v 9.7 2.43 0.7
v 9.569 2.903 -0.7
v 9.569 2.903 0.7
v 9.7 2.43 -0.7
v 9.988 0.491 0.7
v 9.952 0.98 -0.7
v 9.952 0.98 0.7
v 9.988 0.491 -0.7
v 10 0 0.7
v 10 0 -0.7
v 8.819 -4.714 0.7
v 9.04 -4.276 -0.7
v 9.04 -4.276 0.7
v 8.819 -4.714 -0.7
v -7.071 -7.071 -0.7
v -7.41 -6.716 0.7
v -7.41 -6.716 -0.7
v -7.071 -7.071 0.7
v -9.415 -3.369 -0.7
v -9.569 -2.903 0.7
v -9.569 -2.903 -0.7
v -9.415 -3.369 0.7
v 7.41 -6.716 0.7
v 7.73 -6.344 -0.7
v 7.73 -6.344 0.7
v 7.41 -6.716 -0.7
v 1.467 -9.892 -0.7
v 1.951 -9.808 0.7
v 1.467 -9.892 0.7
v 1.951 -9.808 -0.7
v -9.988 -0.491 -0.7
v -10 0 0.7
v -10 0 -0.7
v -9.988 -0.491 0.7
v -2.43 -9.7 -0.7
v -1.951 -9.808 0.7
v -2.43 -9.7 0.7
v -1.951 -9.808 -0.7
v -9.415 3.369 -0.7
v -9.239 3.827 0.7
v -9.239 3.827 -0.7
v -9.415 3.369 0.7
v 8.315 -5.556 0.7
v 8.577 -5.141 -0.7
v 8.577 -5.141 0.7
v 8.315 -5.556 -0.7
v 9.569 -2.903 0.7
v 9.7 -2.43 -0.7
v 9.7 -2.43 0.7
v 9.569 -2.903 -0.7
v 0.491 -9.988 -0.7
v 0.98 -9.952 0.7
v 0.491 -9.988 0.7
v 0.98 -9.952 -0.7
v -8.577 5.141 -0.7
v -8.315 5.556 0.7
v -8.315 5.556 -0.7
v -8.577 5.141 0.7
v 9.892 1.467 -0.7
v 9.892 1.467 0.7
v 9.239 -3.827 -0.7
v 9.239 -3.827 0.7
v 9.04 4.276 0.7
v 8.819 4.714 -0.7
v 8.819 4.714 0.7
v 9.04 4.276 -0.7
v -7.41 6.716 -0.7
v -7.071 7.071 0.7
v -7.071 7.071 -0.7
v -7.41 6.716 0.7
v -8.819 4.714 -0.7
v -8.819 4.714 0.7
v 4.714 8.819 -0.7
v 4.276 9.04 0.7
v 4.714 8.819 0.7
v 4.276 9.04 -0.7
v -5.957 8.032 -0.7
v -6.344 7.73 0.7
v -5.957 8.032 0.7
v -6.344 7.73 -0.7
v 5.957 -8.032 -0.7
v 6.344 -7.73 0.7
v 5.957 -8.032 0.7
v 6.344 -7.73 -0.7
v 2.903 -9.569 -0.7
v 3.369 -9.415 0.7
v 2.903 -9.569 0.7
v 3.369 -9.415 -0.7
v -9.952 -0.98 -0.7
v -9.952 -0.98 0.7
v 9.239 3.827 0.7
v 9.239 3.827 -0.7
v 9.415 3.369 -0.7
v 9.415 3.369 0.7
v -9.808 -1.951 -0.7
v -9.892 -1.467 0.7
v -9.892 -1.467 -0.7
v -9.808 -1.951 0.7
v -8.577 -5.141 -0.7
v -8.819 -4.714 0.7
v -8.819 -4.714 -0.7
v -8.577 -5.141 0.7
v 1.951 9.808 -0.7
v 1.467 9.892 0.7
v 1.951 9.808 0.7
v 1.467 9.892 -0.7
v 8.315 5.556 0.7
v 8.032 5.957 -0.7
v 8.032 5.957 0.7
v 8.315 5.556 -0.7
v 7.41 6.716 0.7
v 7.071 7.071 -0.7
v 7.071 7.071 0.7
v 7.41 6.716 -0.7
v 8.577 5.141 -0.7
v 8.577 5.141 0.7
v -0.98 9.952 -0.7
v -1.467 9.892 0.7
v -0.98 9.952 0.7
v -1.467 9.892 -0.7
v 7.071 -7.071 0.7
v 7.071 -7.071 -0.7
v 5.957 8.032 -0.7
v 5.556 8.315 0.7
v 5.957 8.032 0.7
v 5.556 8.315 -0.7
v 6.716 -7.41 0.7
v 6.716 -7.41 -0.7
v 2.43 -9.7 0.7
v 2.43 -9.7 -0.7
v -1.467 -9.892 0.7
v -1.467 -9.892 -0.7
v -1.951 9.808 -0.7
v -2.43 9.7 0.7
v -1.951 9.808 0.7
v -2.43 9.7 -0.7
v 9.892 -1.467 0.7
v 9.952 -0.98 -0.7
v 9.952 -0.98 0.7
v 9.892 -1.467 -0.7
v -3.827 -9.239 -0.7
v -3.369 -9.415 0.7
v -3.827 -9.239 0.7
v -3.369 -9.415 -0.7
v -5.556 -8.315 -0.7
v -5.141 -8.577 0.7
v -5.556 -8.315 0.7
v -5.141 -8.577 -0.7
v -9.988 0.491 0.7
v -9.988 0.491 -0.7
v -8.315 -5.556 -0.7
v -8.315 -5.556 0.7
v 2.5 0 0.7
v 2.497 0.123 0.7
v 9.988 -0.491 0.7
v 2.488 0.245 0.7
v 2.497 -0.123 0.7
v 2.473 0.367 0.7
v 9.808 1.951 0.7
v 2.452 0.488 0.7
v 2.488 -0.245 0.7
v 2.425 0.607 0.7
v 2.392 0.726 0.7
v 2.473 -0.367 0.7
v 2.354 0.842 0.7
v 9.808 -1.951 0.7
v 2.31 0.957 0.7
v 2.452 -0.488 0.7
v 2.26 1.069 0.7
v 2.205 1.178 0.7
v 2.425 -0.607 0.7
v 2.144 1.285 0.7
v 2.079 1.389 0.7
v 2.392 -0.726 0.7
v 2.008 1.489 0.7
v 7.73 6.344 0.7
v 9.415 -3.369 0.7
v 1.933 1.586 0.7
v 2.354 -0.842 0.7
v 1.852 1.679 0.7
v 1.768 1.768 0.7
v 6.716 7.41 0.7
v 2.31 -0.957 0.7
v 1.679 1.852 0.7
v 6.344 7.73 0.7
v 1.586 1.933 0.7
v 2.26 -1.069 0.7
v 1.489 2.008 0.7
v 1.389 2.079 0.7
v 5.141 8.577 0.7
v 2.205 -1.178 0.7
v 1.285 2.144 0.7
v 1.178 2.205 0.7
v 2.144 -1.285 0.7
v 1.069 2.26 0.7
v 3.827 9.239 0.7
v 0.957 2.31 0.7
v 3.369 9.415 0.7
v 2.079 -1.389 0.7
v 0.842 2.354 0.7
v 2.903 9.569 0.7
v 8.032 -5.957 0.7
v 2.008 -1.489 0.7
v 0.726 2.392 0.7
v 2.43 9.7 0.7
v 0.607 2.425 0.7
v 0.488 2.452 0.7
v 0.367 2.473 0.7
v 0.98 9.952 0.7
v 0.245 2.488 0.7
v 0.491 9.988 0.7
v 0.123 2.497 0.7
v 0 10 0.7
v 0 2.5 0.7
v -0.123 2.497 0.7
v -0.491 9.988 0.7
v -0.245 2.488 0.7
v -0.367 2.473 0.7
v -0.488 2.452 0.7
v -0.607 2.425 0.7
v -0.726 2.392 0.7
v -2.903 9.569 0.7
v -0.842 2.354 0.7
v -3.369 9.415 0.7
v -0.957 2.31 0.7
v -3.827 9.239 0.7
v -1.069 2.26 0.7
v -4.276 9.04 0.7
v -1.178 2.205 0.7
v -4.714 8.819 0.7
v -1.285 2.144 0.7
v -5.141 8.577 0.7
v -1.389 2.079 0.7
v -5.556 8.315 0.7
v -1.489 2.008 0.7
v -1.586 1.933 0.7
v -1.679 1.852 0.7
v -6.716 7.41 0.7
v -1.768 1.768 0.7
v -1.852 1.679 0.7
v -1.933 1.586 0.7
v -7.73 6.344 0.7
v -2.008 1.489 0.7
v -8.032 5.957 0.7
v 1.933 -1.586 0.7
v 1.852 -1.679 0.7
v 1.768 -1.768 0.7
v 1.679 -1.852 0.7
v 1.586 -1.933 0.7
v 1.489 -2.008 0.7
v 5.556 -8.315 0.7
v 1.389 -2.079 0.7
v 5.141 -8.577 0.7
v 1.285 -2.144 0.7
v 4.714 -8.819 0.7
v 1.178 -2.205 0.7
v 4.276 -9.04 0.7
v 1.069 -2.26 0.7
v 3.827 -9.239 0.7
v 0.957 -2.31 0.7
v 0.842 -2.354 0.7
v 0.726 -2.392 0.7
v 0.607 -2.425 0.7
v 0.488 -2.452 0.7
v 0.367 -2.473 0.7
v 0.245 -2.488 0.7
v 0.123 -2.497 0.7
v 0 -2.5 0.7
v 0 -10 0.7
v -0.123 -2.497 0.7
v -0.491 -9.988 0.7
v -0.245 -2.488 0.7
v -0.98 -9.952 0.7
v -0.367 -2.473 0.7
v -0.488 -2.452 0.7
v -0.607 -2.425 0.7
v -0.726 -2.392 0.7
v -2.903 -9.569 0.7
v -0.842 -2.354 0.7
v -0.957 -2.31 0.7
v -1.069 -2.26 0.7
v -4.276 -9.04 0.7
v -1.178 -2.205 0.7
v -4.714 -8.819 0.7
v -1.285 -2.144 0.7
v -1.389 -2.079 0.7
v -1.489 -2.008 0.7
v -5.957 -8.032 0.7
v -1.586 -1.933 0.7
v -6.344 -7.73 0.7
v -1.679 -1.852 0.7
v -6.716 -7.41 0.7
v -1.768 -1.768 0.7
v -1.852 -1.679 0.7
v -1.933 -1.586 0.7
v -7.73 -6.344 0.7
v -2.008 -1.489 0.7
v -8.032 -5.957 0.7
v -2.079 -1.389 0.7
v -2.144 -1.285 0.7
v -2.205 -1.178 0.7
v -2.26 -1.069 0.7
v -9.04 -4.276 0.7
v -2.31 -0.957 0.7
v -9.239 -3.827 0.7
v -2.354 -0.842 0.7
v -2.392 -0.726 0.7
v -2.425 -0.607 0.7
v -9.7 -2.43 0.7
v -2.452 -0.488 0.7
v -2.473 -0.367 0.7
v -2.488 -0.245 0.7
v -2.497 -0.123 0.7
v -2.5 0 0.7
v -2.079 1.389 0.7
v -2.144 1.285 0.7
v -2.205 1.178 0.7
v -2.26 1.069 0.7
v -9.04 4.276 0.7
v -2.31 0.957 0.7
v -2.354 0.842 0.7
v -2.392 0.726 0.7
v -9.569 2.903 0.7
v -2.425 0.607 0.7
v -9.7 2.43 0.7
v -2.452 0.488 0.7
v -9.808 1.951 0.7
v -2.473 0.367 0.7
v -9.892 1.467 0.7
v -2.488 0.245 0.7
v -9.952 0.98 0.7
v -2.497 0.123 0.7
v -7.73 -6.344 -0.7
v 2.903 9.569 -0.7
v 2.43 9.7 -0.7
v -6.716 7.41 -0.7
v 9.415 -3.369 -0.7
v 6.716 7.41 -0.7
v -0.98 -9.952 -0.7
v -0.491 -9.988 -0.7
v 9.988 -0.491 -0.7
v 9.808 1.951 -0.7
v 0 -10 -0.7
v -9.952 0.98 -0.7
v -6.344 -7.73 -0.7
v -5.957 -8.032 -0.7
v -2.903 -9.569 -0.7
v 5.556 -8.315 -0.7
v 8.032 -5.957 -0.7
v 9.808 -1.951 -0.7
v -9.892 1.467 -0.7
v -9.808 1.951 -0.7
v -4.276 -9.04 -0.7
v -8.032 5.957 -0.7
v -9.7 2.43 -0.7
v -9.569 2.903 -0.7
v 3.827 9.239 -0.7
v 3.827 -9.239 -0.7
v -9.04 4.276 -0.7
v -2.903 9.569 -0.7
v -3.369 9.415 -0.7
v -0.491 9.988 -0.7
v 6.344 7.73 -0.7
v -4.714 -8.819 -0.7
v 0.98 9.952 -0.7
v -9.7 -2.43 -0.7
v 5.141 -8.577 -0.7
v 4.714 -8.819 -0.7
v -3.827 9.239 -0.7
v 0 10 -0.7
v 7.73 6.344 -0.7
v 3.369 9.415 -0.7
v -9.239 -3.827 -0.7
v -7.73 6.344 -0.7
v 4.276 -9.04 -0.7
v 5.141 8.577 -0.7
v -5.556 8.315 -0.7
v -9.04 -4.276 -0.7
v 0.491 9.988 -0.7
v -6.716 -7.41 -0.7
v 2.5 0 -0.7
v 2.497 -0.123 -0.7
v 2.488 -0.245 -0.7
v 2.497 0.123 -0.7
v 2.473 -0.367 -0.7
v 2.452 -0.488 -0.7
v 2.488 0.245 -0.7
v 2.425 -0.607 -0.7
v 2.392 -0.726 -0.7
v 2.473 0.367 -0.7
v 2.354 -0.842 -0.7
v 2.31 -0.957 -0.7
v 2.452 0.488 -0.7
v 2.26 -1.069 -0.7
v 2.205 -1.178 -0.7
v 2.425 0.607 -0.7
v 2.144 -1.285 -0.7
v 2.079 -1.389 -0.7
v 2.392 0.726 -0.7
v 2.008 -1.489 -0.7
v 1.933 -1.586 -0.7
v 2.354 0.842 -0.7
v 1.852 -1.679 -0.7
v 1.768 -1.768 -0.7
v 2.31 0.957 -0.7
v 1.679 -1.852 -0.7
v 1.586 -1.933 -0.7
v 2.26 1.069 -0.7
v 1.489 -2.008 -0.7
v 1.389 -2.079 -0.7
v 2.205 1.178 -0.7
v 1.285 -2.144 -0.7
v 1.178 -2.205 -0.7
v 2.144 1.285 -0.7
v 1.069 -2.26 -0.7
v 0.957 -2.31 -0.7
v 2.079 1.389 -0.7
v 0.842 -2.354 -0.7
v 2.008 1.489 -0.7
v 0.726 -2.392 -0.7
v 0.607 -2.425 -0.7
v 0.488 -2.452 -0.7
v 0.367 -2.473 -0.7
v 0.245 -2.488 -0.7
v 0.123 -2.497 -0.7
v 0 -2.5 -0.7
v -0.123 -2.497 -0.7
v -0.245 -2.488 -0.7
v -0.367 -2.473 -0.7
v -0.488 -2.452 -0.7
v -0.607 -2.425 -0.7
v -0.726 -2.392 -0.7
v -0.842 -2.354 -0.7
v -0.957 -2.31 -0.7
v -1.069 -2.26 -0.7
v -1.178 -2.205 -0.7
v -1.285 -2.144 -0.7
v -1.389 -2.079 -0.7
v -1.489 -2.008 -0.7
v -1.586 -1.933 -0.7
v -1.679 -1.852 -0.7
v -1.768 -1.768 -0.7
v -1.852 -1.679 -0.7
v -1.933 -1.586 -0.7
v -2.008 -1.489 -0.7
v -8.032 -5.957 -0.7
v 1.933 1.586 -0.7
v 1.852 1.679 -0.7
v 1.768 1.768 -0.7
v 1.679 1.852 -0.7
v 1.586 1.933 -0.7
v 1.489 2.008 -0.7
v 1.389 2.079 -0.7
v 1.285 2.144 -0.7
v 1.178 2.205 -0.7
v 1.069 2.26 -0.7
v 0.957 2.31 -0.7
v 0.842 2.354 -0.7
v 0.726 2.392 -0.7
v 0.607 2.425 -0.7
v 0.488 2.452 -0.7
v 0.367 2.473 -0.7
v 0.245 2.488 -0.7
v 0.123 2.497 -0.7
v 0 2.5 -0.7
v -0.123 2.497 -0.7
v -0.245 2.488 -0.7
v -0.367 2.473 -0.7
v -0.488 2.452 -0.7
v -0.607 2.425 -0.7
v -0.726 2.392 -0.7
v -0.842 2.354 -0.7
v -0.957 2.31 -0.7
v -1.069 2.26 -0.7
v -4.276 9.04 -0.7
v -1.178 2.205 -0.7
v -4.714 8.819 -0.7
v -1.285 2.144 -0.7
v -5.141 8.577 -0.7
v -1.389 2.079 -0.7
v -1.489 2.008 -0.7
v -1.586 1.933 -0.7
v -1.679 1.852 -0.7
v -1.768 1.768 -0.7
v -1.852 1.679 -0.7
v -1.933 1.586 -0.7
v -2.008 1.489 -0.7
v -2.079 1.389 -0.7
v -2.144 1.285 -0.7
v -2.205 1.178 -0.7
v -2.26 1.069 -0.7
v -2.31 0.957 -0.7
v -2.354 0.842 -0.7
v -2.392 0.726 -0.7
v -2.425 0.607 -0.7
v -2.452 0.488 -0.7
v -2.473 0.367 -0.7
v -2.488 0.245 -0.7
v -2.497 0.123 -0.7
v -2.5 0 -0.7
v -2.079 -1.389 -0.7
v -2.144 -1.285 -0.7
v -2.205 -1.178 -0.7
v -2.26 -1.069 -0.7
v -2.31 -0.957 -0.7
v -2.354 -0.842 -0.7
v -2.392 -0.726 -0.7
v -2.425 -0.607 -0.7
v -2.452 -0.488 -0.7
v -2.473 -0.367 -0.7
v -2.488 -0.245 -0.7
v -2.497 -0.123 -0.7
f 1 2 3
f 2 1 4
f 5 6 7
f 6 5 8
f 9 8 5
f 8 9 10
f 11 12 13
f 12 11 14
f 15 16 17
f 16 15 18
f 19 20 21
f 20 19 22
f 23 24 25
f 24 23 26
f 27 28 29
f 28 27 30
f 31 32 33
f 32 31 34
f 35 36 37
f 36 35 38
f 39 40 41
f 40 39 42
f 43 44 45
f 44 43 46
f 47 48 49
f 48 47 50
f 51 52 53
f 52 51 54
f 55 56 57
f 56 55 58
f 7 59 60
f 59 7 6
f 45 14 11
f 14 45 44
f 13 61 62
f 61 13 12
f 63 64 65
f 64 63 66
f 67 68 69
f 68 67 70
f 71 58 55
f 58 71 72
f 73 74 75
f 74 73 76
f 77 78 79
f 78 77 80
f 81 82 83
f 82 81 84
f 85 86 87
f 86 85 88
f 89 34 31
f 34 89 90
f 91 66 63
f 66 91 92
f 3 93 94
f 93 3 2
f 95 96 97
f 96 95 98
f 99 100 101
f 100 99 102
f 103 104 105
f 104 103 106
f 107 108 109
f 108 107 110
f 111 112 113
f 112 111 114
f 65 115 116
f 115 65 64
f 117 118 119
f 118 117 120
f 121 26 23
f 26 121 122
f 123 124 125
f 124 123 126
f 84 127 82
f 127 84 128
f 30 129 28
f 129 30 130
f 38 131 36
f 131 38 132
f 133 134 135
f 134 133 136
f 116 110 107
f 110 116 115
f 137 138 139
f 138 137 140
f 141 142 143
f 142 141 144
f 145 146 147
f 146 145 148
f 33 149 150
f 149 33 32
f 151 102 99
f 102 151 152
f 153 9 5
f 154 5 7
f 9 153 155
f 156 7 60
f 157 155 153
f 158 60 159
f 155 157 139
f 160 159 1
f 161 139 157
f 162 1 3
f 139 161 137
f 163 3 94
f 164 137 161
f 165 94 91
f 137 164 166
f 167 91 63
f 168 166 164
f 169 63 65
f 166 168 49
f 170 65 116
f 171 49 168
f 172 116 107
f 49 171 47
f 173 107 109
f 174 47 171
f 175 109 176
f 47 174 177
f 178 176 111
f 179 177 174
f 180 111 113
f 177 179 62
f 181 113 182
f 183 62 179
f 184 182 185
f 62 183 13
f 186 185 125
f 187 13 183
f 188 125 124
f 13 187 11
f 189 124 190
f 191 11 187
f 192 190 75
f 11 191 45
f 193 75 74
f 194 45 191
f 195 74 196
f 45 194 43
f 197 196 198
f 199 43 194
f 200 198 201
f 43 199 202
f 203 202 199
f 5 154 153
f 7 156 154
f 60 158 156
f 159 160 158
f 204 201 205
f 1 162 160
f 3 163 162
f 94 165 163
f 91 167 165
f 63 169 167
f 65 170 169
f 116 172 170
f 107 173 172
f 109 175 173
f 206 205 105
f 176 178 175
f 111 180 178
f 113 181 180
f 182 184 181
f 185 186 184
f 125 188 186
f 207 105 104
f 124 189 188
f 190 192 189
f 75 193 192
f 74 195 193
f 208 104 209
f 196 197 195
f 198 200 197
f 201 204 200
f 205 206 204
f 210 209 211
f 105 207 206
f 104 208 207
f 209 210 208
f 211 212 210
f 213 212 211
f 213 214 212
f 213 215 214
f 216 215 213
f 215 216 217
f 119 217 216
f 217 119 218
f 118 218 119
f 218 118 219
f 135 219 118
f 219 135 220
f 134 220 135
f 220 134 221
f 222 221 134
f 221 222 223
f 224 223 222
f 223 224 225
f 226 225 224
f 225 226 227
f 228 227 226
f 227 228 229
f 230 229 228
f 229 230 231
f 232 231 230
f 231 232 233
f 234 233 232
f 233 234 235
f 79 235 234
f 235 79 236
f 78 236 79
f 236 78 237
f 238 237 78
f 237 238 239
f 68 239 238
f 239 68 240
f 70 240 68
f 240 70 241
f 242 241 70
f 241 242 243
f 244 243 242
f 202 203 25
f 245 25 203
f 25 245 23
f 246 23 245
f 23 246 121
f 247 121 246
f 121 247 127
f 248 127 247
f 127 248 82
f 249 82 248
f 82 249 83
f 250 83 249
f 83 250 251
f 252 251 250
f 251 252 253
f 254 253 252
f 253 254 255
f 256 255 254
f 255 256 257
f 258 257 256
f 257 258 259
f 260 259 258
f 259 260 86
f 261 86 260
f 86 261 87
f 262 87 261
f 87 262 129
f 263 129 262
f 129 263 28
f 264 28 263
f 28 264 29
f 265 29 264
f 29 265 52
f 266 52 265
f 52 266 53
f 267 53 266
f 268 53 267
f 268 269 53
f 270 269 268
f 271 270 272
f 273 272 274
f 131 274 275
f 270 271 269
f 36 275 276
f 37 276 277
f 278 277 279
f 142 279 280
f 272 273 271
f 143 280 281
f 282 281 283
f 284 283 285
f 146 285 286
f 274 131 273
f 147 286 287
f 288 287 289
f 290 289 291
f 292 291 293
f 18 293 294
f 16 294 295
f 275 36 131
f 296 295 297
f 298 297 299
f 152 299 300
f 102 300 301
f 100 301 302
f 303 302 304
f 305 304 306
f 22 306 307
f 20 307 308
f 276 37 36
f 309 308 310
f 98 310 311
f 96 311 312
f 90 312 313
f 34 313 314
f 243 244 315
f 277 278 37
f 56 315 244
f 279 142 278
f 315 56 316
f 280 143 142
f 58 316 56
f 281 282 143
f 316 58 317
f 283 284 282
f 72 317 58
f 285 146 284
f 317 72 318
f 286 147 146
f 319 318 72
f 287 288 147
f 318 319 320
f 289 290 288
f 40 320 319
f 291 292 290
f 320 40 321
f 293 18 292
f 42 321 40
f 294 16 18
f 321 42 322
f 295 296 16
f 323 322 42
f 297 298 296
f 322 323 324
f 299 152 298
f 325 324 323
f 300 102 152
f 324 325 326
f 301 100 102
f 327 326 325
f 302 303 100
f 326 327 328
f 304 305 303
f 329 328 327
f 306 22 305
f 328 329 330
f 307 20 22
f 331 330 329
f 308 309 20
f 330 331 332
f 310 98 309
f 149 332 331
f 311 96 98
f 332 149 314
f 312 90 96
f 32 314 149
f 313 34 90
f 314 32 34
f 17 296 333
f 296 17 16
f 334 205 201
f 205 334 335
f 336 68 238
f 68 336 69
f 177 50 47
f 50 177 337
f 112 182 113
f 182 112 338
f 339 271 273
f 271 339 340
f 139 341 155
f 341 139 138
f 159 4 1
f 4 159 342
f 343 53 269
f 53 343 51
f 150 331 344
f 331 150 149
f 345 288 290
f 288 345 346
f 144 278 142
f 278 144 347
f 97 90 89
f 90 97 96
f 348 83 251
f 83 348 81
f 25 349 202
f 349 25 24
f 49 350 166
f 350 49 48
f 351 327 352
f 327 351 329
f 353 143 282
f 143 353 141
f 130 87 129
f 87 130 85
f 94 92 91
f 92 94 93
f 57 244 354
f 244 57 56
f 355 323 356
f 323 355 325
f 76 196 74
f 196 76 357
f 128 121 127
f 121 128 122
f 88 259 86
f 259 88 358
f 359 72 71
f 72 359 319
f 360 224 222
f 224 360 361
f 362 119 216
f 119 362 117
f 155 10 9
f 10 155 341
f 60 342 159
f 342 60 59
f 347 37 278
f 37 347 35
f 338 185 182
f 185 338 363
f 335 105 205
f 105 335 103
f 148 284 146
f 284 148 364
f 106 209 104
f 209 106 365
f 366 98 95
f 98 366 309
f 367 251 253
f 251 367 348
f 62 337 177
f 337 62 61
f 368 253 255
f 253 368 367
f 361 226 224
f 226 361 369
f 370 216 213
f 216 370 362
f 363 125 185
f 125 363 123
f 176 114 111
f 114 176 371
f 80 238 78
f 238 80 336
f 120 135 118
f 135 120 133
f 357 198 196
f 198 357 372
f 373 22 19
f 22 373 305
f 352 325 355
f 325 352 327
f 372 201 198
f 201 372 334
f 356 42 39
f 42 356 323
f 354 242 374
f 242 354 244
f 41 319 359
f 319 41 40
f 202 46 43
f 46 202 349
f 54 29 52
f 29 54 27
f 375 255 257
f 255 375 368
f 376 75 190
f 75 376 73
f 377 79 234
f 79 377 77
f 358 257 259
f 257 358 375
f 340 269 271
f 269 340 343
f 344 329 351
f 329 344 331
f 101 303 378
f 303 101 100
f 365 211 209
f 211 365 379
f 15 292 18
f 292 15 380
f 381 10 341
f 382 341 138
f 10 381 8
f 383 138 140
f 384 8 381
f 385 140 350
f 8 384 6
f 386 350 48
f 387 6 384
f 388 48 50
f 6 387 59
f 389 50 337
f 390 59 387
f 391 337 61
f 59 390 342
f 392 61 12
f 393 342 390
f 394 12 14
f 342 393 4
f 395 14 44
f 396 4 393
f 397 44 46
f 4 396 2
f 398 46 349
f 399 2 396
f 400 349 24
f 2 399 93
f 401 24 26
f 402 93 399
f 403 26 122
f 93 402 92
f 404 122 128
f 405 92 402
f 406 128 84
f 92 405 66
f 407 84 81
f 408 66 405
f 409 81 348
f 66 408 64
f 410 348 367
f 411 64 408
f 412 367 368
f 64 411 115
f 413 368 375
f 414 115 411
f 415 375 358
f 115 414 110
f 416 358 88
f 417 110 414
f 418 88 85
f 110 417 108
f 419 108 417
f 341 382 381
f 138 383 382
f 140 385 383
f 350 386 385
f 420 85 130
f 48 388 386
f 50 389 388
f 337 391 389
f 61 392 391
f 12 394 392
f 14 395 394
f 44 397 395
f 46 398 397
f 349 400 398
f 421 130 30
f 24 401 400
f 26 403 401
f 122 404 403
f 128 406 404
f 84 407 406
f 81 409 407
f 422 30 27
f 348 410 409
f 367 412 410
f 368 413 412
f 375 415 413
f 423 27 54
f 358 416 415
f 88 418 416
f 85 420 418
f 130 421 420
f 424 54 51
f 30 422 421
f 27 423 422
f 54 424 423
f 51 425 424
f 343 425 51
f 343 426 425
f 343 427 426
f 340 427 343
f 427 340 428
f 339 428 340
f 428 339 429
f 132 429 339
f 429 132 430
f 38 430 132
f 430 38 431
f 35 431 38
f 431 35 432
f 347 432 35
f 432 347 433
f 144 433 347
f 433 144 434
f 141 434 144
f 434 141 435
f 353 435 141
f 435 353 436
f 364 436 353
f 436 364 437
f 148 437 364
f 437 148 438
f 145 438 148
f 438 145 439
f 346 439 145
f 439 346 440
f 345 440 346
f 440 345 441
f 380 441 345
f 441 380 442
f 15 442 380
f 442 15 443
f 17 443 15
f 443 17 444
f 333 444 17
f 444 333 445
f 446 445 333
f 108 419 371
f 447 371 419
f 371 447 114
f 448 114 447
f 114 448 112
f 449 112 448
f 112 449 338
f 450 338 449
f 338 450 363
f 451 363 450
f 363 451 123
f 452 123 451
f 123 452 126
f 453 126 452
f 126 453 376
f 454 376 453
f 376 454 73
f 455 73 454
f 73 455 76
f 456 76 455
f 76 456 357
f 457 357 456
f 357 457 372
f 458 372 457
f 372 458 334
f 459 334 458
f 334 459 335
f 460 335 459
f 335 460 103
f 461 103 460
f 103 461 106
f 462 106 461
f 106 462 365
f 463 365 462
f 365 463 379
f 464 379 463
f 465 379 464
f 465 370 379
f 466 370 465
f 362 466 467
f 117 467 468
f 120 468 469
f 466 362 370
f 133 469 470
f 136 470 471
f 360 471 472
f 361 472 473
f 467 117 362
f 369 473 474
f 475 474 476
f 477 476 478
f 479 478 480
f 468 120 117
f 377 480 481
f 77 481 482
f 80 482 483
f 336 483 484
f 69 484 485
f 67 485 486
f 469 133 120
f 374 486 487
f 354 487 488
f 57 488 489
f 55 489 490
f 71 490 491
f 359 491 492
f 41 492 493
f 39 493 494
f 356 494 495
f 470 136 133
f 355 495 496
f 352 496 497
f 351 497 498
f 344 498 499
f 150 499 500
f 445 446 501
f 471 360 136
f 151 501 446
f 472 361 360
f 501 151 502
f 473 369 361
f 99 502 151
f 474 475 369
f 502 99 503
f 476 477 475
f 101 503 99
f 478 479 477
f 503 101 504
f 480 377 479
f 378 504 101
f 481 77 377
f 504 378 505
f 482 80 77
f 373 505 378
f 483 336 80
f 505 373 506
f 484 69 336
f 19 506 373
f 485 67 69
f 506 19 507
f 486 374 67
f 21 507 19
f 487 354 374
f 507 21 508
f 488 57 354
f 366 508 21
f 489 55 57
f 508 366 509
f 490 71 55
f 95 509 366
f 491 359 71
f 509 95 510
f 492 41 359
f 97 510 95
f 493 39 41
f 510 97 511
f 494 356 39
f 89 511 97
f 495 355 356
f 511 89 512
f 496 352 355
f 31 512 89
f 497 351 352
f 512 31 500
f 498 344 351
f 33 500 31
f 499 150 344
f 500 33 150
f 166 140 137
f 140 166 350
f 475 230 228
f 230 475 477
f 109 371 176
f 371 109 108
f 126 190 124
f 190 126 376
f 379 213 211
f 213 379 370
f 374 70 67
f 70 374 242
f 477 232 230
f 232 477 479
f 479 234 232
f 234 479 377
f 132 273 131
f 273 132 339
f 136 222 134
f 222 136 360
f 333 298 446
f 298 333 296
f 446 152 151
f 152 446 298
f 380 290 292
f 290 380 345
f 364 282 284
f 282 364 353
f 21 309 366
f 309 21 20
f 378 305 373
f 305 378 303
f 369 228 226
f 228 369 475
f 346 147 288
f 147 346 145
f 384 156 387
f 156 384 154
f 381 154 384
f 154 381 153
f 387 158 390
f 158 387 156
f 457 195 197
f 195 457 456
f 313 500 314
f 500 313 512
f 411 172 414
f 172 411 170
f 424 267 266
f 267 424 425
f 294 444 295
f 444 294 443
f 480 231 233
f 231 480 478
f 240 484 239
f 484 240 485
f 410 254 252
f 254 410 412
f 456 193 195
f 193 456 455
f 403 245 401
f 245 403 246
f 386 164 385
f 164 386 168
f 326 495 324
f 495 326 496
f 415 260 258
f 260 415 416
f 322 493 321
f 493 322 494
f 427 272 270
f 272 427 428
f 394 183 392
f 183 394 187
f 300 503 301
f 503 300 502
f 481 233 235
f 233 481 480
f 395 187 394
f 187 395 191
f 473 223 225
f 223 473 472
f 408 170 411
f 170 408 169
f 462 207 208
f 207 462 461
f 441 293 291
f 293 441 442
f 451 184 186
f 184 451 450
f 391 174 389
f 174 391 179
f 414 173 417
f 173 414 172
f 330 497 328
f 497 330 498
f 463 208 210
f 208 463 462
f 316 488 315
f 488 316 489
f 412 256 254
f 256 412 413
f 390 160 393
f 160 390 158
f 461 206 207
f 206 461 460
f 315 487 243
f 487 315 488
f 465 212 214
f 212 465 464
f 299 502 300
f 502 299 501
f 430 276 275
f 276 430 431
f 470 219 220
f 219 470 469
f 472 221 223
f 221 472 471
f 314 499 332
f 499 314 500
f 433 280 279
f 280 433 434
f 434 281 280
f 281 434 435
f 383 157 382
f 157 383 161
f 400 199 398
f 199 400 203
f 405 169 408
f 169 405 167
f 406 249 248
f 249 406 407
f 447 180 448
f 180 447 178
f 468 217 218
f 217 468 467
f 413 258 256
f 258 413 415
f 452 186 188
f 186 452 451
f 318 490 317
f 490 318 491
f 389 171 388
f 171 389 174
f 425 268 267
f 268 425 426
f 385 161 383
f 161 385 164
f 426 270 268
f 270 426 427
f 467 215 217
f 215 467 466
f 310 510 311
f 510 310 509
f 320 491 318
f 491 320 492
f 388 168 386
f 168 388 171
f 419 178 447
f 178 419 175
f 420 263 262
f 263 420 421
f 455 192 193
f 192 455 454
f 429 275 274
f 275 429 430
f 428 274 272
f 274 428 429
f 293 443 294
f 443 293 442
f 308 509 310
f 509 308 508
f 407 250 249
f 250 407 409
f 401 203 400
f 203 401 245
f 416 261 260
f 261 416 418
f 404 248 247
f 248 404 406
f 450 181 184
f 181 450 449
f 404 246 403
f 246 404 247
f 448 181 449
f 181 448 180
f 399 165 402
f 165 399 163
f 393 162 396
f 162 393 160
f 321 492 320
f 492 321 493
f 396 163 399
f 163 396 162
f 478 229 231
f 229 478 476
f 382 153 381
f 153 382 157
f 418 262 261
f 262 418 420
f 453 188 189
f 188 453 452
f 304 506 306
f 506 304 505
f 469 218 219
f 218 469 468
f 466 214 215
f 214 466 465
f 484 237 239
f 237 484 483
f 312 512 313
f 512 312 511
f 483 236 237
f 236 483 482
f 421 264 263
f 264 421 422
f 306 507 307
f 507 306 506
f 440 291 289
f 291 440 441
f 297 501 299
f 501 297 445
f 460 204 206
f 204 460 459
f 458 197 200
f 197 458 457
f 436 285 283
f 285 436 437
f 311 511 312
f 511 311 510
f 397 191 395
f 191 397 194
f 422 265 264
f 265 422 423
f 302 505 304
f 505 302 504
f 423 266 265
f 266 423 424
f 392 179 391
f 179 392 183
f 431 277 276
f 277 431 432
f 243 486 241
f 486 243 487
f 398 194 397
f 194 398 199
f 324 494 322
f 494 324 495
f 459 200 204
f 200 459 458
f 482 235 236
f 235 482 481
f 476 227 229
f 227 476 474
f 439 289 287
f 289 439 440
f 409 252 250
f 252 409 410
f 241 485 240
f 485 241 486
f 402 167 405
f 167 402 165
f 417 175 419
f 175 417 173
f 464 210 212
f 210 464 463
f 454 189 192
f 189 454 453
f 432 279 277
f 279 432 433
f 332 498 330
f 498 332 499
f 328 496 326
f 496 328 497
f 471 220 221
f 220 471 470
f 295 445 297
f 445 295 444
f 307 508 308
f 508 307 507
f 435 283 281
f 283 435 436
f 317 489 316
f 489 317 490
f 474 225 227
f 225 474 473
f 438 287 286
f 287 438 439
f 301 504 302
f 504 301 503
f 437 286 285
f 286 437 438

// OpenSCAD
// Penny washer parameters (mm)
inner_diameter_mm = 5.0;   // ID
outer_diameter_mm = 20.0;  // OD
thickness_mm      = 1.4;   // thickness
eps_mm            = 0.02;  // small overlap for clean boolean

$fn = 128;

module penny_washer(id=inner_diameter_mm, od=outer_diameter_mm, t=thickness_mm) {
    difference() {
        cylinder(h=t, r=od/2, center=true);
        cylinder(h=t + 2*eps_mm, r=id/2, center=true);
    }
}

penny_washer();
